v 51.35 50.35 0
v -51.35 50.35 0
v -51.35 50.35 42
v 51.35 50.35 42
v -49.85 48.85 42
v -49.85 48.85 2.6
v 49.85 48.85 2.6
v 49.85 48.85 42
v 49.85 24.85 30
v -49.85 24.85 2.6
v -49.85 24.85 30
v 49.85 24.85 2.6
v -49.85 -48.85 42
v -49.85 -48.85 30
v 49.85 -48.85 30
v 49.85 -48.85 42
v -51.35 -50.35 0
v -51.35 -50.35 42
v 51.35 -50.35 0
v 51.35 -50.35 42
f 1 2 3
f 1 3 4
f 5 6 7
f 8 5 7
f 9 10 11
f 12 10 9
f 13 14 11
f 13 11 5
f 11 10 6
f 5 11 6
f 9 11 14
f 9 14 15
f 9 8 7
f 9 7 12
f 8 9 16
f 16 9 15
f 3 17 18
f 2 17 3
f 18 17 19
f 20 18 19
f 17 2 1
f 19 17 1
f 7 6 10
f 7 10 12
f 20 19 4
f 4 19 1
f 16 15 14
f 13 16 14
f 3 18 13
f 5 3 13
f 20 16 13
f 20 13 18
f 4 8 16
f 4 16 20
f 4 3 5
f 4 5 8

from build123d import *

# Parameters (mm, degrees)
F0_W     = 99.7
F0_H     = 24
F1_DEPTH = 2.6
F0_H_2   = 73.7
F2_DEPTH = 30
F0_W_2   = 102.7
F0_H_3   = 100.7
F3_DEPTH = 42


with BuildPart() as f1:
    # F0 (on Top) → F1 (new body)
    with BuildSketch(Plane.XY):
        with Locations((0, 36.85)):
            Rectangle(F0_W, F0_H)
    extrude(amount=F1_DEPTH)

    # F0 (on Top) → F2 (join)
    with BuildSketch(Plane.XY):
        with Locations((0, -12)):
            Rectangle(F0_W, F0_H_2)
    extrude(amount=F2_DEPTH)

    # F0 (on Top) → F3 (join)
    with BuildSketch(Plane.XY):
        Rectangle(F0_W_2, F0_H_3)
        Polygon((-49.85, 24.85), (-49.85, 48.85), (49.85, 48.85), (49.85, 24.85), (49.85, -48.85), (-49.85, -48.85), align=None, mode=Mode.SUBTRACT)
    extrude(amount=F3_DEPTH)


solid = f1.part
